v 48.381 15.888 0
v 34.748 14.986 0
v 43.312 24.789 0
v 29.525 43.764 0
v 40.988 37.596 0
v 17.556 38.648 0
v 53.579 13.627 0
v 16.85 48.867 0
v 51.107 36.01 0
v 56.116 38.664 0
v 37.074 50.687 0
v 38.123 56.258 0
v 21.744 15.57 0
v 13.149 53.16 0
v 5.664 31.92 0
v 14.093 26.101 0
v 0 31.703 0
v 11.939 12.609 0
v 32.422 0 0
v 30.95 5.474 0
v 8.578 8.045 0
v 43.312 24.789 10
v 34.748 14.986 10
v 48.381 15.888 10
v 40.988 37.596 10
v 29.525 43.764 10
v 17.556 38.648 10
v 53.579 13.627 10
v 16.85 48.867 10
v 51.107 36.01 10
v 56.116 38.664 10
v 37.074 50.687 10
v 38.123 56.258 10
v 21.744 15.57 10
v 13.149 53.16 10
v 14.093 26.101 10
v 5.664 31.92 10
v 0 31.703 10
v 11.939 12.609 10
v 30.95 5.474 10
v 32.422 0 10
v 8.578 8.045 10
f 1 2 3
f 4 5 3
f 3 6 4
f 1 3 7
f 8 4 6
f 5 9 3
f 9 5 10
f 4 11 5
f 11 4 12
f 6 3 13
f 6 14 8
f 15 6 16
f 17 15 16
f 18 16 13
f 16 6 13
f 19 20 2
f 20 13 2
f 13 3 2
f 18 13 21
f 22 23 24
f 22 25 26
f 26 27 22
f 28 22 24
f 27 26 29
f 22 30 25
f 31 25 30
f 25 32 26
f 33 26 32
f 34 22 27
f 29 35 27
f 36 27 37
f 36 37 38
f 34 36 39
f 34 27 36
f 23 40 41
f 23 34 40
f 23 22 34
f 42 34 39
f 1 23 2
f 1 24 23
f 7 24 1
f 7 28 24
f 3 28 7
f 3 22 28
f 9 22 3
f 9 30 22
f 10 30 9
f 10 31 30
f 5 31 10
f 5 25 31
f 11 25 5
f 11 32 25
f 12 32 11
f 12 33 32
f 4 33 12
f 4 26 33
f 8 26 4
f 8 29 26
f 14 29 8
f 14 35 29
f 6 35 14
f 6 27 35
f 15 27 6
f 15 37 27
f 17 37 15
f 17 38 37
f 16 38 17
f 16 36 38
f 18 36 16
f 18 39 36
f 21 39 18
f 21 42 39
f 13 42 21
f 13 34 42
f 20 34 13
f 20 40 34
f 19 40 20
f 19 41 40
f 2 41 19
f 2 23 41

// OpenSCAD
$fn = 32;

// ----------------------------------------------------------------------
// Fan rotor section: 7 blades, 15 mm hub radius, 14 mm blades
// ----------------------------------------------------------------------

// --- parameters (mm) ---
profile_height = 10;      // extrusion height
profile_points = 21;      // points of the closed outline

profile = [[43.312, 24.789], [51.107, 36.01], [56.116, 38.664], [40.988, 37.596], [37.074, 50.687], [38.123, 56.258], [29.525, 43.764], [16.85, 48.867], [13.149, 53.16], [17.556, 38.648], [5.664, 31.92], [0, 31.703], [14.093, 26.101], [11.939, 12.609], [8.578, 8.045], [21.744, 15.57], [30.95, 5.474], [32.422, 0], [34.748, 14.986], [48.381, 15.888], [53.579, 13.627]];  // single closed polygon, 21 points, counter clockwise

// --- the one profile operation ---
linear_extrude(height = profile_height) polygon(points = profile);
